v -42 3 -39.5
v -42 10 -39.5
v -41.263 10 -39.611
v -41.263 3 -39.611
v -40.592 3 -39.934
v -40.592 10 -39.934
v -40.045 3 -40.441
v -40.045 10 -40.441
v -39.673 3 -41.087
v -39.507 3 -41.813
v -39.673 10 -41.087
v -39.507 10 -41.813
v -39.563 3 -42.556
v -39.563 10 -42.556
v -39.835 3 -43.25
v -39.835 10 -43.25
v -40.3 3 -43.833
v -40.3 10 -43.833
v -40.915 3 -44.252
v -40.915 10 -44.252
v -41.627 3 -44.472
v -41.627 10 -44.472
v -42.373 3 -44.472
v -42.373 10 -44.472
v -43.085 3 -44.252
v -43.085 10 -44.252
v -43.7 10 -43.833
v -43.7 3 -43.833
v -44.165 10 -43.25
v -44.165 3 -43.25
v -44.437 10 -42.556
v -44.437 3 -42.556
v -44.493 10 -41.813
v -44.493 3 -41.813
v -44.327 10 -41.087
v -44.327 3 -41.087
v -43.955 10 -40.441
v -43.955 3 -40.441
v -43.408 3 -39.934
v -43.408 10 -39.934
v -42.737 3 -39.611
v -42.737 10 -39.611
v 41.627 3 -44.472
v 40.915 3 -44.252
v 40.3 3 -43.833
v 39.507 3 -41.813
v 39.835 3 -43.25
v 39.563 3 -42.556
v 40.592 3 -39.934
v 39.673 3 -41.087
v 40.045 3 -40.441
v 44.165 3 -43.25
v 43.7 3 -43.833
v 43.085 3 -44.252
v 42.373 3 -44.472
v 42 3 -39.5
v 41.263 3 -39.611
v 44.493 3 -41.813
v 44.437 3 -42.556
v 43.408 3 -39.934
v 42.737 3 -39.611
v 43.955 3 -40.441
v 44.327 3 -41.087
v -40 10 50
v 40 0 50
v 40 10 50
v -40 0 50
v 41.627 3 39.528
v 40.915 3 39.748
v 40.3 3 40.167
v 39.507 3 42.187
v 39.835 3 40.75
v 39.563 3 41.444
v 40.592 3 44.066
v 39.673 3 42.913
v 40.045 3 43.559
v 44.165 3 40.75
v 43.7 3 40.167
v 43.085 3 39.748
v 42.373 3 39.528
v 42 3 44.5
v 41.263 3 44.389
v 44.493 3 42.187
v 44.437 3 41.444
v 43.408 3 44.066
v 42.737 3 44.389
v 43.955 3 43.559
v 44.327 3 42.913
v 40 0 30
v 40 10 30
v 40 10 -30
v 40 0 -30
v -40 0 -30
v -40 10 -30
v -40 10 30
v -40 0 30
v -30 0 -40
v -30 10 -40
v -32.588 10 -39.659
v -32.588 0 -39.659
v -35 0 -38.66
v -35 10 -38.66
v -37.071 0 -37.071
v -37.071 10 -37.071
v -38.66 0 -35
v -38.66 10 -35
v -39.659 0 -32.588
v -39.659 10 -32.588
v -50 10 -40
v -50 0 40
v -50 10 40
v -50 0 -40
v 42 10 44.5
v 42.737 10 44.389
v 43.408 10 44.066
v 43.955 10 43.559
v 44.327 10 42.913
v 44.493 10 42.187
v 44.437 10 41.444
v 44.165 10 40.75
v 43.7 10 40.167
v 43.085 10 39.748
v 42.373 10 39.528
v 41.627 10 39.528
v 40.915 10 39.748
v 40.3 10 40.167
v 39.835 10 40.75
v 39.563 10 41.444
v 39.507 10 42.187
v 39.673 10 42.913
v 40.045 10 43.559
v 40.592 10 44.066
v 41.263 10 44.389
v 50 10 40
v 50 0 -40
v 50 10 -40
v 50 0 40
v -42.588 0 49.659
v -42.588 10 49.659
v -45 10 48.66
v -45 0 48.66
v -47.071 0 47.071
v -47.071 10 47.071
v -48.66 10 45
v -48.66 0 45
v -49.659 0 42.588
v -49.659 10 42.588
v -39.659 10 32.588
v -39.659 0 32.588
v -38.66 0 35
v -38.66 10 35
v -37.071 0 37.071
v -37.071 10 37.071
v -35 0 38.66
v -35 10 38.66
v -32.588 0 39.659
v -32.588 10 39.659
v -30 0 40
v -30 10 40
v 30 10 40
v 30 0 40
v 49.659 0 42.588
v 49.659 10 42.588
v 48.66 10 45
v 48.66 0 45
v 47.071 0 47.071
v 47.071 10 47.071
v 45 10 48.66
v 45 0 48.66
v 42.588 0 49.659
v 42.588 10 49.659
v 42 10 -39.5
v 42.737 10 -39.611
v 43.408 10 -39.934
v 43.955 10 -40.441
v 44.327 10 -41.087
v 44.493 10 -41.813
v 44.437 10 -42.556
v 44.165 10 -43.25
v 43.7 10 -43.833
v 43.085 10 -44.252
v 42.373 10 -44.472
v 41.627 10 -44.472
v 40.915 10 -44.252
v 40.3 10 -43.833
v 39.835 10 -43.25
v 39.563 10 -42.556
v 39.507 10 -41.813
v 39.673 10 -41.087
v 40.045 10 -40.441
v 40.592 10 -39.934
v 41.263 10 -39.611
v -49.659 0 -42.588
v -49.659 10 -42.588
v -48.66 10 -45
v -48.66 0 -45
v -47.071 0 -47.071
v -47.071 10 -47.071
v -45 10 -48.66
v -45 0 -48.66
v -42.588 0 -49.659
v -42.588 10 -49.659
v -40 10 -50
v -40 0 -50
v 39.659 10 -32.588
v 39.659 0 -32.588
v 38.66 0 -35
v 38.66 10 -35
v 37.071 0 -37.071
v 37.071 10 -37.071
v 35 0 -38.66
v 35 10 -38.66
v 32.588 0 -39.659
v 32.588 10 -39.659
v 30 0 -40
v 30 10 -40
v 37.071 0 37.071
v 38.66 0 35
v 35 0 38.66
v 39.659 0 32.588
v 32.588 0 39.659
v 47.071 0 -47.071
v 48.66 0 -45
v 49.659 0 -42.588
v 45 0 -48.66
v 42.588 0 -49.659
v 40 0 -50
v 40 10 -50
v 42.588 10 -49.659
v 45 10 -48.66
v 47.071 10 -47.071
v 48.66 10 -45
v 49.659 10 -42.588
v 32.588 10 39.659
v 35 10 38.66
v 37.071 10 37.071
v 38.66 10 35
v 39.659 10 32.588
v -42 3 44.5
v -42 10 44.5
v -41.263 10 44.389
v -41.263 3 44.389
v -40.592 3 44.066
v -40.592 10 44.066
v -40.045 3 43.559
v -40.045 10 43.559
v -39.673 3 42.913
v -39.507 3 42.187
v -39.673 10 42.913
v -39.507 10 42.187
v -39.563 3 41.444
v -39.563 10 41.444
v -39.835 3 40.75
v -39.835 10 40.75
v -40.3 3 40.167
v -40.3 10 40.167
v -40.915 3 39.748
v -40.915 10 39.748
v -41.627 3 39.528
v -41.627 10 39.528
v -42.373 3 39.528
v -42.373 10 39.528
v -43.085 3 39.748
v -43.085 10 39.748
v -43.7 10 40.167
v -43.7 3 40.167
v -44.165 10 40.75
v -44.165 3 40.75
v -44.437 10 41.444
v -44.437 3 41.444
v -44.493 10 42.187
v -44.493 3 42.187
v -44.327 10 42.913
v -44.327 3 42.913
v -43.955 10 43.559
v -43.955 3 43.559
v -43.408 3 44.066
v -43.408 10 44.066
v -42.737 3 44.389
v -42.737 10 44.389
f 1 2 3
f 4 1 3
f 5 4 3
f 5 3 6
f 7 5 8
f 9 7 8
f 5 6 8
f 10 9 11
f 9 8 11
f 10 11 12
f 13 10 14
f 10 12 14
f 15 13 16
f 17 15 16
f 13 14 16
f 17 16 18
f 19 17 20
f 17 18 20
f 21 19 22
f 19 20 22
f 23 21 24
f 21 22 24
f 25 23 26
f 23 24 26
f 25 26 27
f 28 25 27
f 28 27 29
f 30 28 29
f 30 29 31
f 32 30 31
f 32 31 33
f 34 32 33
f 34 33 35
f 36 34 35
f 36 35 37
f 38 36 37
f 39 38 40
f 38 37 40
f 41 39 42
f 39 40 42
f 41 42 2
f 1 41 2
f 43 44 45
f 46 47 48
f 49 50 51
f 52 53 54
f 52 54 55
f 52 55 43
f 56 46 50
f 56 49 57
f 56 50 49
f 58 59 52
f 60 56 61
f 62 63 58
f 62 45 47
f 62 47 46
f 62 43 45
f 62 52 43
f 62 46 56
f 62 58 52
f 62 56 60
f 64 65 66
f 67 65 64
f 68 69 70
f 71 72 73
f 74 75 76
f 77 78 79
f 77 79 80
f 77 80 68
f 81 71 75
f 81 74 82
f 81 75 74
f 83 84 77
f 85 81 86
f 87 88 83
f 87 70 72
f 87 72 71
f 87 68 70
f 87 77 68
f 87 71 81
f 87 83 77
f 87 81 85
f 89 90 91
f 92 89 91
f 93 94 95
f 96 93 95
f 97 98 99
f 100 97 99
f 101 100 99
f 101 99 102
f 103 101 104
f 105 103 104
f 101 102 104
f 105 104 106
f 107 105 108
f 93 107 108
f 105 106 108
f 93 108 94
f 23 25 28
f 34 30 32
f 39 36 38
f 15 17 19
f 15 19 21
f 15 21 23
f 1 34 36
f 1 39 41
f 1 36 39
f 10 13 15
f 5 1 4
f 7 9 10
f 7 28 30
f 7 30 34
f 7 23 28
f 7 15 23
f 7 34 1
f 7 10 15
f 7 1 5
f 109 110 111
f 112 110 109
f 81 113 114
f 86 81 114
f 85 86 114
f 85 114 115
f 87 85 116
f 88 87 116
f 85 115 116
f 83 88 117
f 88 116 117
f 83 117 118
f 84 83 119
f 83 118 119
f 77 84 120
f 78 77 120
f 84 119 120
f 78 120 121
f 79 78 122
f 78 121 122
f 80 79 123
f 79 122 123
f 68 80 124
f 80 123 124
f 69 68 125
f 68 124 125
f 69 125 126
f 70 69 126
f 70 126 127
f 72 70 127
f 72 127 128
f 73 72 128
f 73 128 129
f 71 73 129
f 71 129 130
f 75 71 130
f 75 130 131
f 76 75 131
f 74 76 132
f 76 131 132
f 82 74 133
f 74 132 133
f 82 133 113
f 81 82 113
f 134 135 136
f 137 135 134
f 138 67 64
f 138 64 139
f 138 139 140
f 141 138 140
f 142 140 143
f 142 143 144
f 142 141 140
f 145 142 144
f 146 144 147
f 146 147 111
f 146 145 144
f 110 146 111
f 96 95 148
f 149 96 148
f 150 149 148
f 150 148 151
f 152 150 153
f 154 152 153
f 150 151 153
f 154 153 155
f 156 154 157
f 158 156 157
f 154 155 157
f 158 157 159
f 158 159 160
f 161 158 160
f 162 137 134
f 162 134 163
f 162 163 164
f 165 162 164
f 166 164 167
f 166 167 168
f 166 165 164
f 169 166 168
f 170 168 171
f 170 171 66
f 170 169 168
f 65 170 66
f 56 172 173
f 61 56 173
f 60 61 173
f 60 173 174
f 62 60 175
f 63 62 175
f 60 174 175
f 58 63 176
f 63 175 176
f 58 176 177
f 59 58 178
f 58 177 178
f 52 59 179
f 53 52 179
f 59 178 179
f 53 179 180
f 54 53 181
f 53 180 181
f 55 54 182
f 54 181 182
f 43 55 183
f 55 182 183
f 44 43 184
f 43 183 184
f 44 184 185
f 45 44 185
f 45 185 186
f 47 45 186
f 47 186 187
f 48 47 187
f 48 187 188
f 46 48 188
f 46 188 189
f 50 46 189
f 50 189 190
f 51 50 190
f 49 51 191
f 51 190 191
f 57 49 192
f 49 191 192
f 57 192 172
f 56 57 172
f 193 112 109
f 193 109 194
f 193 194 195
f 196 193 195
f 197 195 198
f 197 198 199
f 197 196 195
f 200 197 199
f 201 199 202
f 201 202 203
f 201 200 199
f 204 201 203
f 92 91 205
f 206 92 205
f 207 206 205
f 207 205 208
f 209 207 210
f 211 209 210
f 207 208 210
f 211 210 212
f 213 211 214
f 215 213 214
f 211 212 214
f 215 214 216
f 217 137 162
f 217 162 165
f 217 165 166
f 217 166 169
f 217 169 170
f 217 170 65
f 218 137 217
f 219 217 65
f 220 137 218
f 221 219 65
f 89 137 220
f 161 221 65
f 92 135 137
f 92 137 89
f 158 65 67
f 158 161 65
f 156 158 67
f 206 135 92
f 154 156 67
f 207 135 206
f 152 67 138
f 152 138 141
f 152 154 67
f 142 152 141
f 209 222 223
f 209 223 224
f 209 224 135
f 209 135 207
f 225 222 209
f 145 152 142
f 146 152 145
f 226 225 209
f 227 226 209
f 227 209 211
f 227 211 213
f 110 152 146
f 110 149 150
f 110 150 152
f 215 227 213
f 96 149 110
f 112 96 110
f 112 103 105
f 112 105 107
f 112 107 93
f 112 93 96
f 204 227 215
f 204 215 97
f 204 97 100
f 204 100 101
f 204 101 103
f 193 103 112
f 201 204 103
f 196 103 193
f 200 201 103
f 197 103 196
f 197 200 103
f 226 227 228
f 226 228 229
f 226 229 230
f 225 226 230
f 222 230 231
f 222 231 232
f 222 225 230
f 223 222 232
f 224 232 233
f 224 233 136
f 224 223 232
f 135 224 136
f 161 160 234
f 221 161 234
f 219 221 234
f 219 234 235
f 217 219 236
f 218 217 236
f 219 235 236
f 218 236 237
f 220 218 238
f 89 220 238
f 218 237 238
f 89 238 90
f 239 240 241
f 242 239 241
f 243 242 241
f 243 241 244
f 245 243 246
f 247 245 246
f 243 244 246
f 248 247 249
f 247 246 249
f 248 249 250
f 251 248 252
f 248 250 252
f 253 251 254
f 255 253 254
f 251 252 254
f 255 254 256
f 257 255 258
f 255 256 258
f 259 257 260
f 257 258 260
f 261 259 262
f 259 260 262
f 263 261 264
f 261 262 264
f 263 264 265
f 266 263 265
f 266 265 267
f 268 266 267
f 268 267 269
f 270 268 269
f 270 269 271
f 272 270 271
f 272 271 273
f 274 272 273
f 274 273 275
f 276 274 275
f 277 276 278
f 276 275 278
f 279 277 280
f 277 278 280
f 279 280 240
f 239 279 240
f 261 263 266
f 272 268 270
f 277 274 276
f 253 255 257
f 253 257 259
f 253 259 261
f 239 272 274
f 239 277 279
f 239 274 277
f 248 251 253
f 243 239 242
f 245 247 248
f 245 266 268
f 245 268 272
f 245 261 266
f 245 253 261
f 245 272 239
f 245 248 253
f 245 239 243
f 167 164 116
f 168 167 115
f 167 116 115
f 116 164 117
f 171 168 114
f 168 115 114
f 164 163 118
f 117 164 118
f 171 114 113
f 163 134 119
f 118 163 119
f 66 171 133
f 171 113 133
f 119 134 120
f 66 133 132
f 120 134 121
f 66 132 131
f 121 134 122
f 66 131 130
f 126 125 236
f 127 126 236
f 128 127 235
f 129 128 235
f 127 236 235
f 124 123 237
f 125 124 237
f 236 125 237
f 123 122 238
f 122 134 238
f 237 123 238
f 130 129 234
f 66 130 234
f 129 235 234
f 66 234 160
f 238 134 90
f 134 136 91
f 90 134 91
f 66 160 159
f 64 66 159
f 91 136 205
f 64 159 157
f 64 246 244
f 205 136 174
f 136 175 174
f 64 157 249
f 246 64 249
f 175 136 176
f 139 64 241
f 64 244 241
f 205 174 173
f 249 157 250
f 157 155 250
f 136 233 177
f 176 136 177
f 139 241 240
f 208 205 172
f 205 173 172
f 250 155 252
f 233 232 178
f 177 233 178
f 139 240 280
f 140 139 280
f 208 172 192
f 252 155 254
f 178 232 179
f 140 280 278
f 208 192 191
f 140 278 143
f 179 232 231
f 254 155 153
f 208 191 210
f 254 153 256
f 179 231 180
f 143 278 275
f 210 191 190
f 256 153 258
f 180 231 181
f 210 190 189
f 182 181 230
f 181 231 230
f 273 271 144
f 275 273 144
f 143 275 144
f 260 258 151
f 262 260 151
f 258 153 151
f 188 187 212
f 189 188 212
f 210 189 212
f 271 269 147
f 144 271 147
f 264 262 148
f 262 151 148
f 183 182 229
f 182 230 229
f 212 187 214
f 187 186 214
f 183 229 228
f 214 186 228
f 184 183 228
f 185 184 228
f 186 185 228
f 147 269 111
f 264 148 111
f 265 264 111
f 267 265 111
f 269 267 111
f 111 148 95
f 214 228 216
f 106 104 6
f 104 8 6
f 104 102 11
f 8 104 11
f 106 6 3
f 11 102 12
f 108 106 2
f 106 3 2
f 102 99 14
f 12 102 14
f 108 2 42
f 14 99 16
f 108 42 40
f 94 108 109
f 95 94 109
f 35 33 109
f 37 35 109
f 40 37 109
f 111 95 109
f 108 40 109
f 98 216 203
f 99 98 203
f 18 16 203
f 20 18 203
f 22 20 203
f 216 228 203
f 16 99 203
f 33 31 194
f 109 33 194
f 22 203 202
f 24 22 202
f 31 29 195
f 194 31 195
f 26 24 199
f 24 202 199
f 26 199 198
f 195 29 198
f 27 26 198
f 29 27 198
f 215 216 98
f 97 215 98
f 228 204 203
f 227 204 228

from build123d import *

# Parameters (mm, degrees)
BOSS_EXTRUDE1_DEPTH = 10
CUT_EXTRUDE1_DEPTH  = 10
SKETCH3_R           = 2.5
CUT_EXTRUDE2_DEPTH  = 7


with BuildPart() as part:
    # Sketch1 → Boss-Extrude1 (new body)
    with BuildSketch(Plane(origin=(0, 0, 0), x_dir=(1, 0, 0), z_dir=(0, 1, 0))):
        with BuildLine():
            Line((-40, 50), (40, 50))
            ThreePointArc((40, 50), (47.071067812, 47.071067812), (50, 40))
            Line((50, 40), (50, -40))
            ThreePointArc((50, -40), (47.071067812, -47.071067812), (40, -50))
            Line((40, -50), (-40, -50))
            ThreePointArc((-40, -50), (-47.071067812, -47.071067812), (-50, -40))
            Line((-50, -40), (-50, 40))
            ThreePointArc((-50, 40), (-47.071067812, 47.071067812), (-40, 50))
        make_face()
    extrude(amount=BOSS_EXTRUDE1_DEPTH)

    # Sketch2 → Cut-Extrude1 (cut)
    with BuildSketch(Plane(origin=(0, 10, 0), x_dir=(1, 0, 0), z_dir=(0, 1, 0))):
        with BuildLine():
            Line((-30, -40), (30, -40))
            ThreePointArc((30, -40), (37.071067812, -37.071067812), (40, -30))
            Line((40, -30), (40, 30))
            ThreePointArc((40, 30), (37.071067812, 37.071067812), (30, 40))
            Line((30, 40), (-30, 40))
            ThreePointArc((-30, 40), (-37.071067812, 37.071067812), (-40, 30))
            Line((-40, 30), (-40, -30))
            ThreePointArc((-40, -30), (-37.071067812, -37.071067812), (-30, -40))
        make_face()
    extrude(amount=-CUT_EXTRUDE1_DEPTH, mode=Mode.SUBTRACT)

    # Sketch3 → Cut-Extrude2 (cut)
    with BuildSketch(Plane(origin=(0, 10, 0), x_dir=(1, 0, 0), z_dir=(0, 1, 0))):
        with Locations(Location((-42, 42, 0), (0, 0, 270))):
            Circle(SKETCH3_R)
        with Locations(Location((42, 42, 0), (0, 0, 270))):
            Circle(SKETCH3_R)
        with Locations(Location((42.000013816, -42, 0), (0, 0, 270))):
            Circle(SKETCH3_R)
        with Locations(Location((-41.999986184, -42, 0), (0, 0, 270))):
            Circle(SKETCH3_R)
    extrude(amount=-CUT_EXTRUDE2_DEPTH, mode=Mode.SUBTRACT)


solid = part.part
